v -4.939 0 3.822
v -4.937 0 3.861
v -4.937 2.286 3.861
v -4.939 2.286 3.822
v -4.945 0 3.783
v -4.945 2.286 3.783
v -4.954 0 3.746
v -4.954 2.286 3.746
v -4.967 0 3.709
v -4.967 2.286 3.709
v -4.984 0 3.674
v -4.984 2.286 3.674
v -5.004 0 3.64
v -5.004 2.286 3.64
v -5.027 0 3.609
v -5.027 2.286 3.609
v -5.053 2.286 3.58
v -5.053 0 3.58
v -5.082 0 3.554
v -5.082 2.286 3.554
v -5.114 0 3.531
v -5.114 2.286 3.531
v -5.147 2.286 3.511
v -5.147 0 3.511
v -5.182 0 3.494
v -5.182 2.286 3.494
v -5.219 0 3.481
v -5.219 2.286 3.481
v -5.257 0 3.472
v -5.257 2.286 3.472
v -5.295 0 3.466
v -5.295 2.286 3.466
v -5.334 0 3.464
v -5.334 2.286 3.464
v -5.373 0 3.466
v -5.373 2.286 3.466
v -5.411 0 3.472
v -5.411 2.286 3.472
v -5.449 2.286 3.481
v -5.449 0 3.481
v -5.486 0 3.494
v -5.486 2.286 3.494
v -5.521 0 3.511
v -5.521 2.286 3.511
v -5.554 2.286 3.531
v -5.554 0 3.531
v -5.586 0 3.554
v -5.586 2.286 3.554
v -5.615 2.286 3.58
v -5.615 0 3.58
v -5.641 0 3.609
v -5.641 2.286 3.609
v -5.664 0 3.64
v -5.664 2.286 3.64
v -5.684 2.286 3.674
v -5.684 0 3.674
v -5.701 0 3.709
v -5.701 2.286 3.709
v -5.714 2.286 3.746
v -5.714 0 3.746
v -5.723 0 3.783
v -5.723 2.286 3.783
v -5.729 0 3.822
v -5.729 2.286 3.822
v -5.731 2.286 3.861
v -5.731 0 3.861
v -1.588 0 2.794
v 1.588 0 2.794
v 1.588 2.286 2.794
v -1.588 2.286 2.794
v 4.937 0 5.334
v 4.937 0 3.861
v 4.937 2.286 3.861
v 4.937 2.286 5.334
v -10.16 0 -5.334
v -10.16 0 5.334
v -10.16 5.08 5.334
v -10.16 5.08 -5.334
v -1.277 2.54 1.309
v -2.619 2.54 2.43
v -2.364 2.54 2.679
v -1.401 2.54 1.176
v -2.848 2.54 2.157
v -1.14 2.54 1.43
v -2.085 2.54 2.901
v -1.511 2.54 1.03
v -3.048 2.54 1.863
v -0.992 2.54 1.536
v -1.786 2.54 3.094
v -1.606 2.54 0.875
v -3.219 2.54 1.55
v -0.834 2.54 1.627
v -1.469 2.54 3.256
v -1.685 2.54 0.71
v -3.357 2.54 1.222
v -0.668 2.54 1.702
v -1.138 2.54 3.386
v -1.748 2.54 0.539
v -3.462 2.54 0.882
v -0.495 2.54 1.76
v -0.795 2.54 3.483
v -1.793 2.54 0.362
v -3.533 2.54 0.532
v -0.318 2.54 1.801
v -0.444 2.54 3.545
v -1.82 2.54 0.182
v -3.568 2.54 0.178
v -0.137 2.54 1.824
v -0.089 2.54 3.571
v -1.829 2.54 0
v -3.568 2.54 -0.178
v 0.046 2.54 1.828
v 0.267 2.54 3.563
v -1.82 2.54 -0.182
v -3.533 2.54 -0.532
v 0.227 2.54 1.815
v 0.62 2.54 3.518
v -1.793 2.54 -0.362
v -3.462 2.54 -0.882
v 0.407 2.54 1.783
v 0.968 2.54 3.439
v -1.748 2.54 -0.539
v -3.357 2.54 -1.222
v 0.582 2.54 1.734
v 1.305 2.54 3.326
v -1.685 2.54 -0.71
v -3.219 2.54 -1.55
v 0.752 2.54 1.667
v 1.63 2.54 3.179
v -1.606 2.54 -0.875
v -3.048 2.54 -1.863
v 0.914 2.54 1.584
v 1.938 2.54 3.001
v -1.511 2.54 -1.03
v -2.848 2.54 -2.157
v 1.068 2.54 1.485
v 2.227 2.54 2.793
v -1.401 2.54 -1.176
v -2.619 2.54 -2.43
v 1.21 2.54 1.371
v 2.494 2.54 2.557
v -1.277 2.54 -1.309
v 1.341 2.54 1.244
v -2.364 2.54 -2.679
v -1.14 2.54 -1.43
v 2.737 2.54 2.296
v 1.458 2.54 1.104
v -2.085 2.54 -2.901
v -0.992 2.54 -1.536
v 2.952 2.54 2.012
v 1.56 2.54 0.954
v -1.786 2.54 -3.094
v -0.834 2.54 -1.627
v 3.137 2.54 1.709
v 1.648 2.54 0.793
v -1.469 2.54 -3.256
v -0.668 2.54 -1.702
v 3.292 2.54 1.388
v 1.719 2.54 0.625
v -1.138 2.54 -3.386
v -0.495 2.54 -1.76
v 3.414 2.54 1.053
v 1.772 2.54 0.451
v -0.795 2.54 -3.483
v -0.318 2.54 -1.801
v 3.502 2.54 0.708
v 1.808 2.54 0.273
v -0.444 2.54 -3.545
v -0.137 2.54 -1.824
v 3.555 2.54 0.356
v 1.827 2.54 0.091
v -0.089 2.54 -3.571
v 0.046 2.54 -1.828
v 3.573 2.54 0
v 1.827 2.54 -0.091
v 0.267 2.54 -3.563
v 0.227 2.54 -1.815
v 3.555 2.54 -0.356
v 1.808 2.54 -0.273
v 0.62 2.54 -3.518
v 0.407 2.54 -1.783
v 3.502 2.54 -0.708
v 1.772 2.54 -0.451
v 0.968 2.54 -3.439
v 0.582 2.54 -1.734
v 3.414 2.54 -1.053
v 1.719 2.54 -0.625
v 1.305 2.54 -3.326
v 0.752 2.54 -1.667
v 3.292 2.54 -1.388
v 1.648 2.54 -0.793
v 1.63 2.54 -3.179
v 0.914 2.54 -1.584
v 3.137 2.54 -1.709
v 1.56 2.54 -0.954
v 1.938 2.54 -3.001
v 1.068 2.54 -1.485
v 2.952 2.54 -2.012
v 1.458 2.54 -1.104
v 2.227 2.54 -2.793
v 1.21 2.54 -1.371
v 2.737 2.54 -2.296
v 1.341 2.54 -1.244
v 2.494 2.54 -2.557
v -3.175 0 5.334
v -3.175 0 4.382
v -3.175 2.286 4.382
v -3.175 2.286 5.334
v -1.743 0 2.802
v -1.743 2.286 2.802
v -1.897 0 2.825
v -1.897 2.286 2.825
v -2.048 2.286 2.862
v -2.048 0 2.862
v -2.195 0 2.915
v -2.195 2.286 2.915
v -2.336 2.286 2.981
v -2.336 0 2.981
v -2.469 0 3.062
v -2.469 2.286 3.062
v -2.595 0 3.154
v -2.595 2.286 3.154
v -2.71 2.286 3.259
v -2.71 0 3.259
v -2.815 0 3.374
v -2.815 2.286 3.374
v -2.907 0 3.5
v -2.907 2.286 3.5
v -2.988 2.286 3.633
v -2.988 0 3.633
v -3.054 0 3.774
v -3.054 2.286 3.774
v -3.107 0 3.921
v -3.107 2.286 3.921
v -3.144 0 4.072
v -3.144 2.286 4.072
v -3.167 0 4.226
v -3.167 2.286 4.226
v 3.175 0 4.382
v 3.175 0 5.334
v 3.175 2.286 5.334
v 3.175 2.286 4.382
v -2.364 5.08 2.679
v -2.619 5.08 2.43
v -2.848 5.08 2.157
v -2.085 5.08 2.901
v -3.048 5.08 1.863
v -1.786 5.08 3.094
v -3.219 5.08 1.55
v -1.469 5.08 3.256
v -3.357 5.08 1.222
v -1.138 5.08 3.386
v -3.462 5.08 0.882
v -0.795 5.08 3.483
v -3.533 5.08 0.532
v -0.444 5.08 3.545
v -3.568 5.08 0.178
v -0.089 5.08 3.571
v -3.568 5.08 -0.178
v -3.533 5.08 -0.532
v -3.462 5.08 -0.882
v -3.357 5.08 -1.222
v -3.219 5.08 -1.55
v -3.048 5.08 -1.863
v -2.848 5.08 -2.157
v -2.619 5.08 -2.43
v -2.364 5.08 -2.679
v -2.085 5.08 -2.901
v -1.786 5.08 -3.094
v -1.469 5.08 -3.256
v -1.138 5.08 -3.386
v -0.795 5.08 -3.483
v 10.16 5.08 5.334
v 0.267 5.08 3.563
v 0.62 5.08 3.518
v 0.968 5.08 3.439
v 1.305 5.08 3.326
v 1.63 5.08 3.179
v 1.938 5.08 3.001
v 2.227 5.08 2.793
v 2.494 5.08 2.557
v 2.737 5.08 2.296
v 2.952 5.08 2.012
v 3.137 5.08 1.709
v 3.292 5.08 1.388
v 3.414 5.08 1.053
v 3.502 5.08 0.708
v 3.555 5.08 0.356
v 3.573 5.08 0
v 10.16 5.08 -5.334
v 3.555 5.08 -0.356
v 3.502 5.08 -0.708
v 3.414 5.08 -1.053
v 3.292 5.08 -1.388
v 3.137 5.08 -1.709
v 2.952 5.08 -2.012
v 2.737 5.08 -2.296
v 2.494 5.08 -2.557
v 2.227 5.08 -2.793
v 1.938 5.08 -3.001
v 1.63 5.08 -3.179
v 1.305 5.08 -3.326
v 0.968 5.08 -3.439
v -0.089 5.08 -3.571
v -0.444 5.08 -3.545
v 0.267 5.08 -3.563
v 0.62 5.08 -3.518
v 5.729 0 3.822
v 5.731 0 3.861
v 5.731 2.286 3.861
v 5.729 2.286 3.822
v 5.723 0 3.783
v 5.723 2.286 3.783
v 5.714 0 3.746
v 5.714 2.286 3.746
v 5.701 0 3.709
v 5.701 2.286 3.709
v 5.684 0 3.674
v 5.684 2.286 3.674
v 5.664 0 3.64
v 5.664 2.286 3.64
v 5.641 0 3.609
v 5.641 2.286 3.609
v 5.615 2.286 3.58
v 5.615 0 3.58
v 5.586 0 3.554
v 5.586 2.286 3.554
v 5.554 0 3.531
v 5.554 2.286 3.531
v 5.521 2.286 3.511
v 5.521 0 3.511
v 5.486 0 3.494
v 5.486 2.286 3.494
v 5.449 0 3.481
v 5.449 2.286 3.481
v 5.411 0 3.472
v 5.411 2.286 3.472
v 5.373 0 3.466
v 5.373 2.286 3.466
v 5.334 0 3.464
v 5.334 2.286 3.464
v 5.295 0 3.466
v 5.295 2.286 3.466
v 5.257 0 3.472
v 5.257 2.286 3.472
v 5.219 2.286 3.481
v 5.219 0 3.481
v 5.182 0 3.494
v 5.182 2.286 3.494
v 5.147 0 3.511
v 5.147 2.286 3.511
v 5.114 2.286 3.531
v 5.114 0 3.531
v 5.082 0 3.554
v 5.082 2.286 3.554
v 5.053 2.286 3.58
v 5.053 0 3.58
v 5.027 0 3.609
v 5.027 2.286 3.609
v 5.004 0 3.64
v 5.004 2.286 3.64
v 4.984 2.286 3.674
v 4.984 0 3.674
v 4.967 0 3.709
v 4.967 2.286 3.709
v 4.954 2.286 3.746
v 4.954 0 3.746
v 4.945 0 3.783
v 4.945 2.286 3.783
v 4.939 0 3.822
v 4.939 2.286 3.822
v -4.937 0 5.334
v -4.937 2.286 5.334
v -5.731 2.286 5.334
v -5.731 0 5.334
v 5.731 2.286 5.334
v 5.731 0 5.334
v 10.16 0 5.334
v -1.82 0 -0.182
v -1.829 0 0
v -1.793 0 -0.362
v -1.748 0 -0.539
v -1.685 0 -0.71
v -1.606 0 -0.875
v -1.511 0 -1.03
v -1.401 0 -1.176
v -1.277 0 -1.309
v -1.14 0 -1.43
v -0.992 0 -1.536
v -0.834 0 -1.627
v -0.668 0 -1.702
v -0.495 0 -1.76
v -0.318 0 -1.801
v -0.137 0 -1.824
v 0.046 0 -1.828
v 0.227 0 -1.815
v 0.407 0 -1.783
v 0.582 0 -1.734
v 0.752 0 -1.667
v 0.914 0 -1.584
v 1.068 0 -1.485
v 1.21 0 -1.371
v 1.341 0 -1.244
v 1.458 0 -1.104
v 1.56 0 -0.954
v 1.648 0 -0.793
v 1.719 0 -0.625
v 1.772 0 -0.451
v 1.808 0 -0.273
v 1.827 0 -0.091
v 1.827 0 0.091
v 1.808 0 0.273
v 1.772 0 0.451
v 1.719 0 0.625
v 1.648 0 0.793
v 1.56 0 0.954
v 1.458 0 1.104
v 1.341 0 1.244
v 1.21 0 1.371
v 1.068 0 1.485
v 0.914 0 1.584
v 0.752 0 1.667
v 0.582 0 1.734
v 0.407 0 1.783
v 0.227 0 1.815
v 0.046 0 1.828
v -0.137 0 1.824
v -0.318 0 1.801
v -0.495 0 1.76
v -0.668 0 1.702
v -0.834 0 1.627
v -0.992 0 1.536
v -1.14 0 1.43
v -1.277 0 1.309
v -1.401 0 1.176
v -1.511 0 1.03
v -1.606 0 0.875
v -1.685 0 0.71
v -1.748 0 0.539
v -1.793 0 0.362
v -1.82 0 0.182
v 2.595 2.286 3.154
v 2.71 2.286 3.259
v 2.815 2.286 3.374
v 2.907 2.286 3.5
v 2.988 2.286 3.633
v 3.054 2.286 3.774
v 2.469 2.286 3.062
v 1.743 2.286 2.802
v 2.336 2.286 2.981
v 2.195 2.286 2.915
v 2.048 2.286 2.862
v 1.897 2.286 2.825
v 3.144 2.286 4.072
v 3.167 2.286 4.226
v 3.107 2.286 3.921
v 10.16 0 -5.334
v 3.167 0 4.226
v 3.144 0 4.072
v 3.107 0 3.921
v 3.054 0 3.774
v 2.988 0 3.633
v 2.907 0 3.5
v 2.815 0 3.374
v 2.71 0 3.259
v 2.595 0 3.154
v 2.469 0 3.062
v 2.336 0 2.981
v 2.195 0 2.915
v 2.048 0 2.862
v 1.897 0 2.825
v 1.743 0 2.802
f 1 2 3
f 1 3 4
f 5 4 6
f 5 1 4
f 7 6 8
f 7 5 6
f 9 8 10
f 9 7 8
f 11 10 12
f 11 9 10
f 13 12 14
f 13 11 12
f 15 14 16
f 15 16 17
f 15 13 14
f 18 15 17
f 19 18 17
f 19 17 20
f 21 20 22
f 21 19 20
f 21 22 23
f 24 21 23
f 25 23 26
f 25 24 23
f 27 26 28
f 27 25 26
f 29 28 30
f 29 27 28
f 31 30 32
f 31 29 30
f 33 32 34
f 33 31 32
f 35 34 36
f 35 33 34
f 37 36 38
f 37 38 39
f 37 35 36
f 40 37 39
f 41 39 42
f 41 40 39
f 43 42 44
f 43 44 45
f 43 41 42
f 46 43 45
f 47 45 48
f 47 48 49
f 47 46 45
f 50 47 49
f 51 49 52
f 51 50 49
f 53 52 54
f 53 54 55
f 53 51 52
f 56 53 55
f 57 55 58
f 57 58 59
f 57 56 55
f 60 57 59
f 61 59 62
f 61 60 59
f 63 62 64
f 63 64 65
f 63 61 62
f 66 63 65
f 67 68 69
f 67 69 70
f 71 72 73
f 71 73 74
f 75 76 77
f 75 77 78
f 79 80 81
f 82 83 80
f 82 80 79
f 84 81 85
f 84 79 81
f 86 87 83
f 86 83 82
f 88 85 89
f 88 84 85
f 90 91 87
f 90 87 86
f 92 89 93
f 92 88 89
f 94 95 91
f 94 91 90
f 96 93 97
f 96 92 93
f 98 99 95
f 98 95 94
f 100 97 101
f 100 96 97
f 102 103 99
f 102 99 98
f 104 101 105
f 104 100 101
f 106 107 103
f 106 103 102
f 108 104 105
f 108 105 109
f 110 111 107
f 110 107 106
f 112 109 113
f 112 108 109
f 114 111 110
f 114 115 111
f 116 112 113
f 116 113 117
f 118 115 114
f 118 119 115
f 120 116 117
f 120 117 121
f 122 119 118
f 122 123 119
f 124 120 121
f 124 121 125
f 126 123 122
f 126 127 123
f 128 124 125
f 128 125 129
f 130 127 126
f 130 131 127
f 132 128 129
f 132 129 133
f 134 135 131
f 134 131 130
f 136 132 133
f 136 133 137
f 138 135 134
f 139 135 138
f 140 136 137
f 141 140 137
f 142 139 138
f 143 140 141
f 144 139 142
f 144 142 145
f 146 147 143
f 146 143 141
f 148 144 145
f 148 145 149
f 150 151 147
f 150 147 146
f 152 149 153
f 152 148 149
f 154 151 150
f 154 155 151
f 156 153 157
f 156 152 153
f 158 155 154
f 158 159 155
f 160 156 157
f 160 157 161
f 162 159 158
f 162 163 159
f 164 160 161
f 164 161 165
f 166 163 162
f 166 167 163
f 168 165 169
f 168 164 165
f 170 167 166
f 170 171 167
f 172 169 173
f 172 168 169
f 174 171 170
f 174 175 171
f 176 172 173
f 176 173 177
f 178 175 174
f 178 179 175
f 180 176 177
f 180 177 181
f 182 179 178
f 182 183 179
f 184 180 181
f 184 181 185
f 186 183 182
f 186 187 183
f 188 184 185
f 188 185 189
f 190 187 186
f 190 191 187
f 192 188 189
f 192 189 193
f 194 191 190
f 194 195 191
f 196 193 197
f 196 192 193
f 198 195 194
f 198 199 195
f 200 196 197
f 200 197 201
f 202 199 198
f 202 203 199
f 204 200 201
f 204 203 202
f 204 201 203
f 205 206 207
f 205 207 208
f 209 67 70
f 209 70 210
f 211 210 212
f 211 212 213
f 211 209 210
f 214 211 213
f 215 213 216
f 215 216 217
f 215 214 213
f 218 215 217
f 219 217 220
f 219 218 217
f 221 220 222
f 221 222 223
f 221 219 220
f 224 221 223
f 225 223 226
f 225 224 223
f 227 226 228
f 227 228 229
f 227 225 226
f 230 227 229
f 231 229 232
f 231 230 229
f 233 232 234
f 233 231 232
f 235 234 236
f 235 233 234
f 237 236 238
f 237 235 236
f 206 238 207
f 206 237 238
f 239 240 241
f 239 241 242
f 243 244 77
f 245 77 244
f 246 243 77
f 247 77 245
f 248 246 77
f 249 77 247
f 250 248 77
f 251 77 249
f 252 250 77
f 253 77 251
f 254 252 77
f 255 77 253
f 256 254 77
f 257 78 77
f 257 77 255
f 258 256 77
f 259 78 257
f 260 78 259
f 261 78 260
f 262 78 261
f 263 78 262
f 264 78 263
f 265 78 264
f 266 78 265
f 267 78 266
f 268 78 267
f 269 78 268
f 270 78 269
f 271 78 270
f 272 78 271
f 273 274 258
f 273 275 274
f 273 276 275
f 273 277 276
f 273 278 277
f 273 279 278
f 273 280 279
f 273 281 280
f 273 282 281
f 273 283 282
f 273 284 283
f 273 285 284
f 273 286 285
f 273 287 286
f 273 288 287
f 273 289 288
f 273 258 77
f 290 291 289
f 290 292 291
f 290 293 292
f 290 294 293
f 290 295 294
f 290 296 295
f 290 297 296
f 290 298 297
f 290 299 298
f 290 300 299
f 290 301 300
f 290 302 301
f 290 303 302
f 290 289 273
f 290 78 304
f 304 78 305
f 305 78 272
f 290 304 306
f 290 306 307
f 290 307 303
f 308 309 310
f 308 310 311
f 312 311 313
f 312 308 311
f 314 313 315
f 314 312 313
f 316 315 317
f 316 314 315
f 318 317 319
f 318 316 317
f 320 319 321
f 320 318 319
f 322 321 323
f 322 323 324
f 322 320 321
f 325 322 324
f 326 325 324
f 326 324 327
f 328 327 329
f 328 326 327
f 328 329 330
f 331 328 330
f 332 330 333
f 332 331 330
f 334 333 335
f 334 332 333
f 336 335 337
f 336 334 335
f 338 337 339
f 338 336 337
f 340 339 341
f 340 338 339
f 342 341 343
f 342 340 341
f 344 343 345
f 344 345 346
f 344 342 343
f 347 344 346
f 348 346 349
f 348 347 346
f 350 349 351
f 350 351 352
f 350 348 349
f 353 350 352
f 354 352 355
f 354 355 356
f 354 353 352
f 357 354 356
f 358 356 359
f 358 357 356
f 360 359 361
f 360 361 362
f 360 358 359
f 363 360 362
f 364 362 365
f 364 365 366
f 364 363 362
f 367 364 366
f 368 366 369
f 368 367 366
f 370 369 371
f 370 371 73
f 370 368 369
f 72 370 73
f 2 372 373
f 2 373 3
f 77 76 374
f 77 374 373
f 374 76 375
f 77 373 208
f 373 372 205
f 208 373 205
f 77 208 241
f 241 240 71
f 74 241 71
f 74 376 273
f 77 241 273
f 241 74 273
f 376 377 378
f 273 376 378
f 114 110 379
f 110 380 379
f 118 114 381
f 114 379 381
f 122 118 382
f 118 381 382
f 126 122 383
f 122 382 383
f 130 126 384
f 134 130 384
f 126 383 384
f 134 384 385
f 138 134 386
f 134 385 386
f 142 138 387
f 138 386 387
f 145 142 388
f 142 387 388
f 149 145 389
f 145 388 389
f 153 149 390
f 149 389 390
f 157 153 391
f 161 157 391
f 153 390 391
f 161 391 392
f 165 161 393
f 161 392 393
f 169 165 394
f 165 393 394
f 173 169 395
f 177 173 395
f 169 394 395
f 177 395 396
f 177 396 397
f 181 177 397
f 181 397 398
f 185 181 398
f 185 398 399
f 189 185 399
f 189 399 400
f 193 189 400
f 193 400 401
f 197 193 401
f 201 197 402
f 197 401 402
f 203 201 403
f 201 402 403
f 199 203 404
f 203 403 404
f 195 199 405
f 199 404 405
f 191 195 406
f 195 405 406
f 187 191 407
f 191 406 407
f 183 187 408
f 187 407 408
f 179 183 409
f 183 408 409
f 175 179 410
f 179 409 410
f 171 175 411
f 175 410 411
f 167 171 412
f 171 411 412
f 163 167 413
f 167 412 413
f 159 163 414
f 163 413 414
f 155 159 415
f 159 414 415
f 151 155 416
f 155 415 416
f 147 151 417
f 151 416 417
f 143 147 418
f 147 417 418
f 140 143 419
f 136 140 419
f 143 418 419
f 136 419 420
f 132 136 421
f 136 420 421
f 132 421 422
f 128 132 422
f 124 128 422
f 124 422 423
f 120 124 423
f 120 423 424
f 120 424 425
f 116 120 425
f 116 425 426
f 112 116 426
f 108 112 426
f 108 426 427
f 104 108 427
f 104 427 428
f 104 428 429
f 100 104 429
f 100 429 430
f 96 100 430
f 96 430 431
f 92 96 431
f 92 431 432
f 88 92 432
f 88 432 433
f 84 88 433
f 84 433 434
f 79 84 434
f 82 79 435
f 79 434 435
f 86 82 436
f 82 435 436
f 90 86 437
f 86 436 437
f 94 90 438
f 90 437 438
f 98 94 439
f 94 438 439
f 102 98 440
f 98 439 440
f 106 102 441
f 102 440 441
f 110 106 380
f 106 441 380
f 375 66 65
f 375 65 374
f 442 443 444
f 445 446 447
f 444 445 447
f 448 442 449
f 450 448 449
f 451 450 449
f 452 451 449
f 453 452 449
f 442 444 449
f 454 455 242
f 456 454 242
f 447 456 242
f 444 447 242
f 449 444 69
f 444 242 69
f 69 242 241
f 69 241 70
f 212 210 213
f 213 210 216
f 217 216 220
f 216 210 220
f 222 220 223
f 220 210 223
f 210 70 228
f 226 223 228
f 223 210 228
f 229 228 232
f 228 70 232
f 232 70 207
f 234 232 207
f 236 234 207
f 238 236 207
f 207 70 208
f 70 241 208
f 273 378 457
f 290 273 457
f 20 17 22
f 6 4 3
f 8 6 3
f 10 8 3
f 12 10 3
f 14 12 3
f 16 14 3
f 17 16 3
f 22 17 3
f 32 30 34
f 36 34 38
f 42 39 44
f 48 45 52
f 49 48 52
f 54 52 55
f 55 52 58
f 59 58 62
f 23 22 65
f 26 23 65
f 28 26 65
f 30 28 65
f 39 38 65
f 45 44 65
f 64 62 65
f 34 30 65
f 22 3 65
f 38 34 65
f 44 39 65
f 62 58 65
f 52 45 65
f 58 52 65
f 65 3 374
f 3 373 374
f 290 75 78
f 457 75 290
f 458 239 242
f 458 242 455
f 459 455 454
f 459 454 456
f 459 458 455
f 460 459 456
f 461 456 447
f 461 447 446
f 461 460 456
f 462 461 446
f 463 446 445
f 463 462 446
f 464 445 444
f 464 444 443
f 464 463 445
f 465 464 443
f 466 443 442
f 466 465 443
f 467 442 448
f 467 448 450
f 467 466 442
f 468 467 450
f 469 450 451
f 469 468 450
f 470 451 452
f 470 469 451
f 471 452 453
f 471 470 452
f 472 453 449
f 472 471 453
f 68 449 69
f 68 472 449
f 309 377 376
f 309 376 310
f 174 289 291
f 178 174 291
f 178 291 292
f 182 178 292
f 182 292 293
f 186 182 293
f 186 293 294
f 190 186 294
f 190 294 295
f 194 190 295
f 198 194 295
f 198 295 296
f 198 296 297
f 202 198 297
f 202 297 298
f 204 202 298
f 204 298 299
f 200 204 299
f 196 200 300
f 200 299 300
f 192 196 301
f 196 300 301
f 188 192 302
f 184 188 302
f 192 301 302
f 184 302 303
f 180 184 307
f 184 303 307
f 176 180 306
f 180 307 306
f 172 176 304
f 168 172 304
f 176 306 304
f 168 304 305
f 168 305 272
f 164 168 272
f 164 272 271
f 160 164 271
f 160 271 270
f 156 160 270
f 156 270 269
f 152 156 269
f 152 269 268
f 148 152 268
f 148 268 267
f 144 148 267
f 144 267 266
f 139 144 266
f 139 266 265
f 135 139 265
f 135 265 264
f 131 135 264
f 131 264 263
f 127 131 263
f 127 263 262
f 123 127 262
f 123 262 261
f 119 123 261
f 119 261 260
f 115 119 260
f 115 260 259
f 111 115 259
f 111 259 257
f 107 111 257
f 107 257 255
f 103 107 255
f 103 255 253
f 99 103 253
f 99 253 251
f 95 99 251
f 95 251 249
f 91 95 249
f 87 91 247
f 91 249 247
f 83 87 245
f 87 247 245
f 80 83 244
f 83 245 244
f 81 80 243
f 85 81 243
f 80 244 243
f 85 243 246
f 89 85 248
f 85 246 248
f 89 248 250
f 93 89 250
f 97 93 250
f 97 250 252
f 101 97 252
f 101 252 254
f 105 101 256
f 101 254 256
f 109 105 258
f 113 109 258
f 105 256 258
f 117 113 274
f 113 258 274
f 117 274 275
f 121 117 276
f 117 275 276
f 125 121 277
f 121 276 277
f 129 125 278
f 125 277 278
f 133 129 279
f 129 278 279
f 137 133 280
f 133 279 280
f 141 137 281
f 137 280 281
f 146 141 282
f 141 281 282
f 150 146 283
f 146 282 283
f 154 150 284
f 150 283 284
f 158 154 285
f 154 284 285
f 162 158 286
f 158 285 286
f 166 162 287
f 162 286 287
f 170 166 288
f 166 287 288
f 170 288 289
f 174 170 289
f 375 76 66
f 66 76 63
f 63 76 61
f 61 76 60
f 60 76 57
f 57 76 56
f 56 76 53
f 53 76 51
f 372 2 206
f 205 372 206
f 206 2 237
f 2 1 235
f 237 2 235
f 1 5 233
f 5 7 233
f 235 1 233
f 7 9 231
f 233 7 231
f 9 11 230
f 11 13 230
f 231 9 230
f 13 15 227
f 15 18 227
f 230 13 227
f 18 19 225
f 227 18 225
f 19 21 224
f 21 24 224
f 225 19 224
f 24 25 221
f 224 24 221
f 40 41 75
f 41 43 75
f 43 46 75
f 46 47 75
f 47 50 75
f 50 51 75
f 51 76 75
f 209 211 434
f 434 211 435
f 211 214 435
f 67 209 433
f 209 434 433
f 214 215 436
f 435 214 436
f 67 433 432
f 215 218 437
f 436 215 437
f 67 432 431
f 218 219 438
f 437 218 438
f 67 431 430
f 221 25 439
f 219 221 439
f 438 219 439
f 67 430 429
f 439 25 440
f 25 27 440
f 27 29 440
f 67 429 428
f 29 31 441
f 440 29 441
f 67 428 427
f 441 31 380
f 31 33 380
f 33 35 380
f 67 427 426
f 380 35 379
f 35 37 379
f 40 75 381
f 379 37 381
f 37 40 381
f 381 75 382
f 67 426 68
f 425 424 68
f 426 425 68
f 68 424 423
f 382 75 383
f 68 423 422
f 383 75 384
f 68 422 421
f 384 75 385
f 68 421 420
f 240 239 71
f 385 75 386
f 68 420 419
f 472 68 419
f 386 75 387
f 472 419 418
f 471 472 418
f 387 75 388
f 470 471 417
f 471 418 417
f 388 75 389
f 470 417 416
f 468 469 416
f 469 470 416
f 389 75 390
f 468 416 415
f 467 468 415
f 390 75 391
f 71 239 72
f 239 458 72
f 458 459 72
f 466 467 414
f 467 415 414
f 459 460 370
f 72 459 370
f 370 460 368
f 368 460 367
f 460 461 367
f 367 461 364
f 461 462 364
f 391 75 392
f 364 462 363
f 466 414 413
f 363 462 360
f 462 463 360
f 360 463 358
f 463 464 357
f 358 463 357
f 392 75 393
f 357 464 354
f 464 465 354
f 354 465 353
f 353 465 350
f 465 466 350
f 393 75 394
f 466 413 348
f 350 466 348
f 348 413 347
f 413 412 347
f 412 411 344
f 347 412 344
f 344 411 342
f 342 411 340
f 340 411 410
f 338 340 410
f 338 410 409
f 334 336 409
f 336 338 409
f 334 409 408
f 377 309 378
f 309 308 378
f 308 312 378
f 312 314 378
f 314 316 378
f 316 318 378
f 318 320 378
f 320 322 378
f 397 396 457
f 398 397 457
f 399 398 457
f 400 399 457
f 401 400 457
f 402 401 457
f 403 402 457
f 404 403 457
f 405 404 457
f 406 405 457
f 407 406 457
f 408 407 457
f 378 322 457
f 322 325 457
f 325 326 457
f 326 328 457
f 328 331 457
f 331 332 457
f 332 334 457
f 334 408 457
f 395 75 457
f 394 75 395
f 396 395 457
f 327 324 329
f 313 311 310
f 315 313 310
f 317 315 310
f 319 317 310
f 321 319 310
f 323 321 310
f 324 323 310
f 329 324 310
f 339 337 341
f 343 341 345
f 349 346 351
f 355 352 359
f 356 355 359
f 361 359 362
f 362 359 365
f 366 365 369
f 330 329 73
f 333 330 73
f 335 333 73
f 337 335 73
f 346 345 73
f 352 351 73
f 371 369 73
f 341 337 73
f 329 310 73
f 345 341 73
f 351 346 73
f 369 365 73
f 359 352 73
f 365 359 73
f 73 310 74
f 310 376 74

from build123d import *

# Parameters (mm, degrees)
SKETCH1_W               = 20.32
SKETCH1_H               = 10.668
BASE_DEPTH              = 5.08
BOXSLOTS_DEPTH          = 2.286
MOUTINGHOLE_D           = 3.6576
MOUTINGHOLE_CBORE_D     = 7.14502
MOUTINGHOLE_CBORE_DEPTH = 2.54
CUT_EXTRUDE1_DEPTH      = 2.286


with BuildPart() as part:
    # Sketch1 → Base (new body)
    with BuildSketch(Plane(origin=(0, 0, 0), x_dir=(1, 0, 0), z_dir=(0, 1, 0))):
        Rectangle(SKETCH1_W, SKETCH1_H)
    extrude(amount=BASE_DEPTH)

    # Sketch2 → BoxSlots (cut)
    with BuildSketch(Plane.XZ):
        with BuildLine():
            Line((-4.937125, 5.334), (-4.937125, 3.8608))
            ThreePointArc((-4.937125, 3.8608), (-5.334, 3.463925), (-5.730875, 3.8608))
            Line((-5.730875, 3.8608), (-5.730875, 5.334))
            ThreePointArc((-5.730875, 5.334), (-5.334, 5.730875), (-4.937125, 5.334))
        make_face()
        with BuildLine():
            Line((5.730875, 5.334), (5.730875, 3.8608))
            ThreePointArc((5.730875, 3.8608), (5.334, 3.463925), (4.937125, 3.8608))
            Line((4.937125, 3.8608), (4.937125, 5.334))
            ThreePointArc((4.937125, 5.334), (5.334, 5.730875), (5.730875, 5.334))
        make_face()
    extrude(amount=-BOXSLOTS_DEPTH, mode=Mode.SUBTRACT)

    # MoutingHole (through all)
    with Locations(Plane(origin=(0, 5.08, 0), x_dir=(1, 0, 0), z_dir=(0, 1, 0))):
        with Locations((0, 0)):
            CounterBoreHole(MOUTINGHOLE_D / 2, MOUTINGHOLE_CBORE_D / 2, MOUTINGHOLE_CBORE_DEPTH)

    # Sketch7 → Cut-Extrude1 (cut)
    with BuildSketch(Plane.XZ):
        with BuildLine():
            Line((-3.175, 5.334), (3.175, 5.334))
            Line((3.175, 5.334), (3.175, 4.3815))
            ThreePointArc((3.175, 4.3815), (2.710032015, 3.258967985), (1.5875, 2.794))
            Line((1.5875, 2.794), (-1.5875, 2.794))
            ThreePointArc((-1.5875, 2.794), (-2.710032015, 3.258967985), (-3.175, 4.3815))
            Line((-3.175, 4.3815), (-3.175, 5.334))
        make_face()
    extrude(amount=-CUT_EXTRUDE1_DEPTH, mode=Mode.SUBTRACT)


solid = part.part
